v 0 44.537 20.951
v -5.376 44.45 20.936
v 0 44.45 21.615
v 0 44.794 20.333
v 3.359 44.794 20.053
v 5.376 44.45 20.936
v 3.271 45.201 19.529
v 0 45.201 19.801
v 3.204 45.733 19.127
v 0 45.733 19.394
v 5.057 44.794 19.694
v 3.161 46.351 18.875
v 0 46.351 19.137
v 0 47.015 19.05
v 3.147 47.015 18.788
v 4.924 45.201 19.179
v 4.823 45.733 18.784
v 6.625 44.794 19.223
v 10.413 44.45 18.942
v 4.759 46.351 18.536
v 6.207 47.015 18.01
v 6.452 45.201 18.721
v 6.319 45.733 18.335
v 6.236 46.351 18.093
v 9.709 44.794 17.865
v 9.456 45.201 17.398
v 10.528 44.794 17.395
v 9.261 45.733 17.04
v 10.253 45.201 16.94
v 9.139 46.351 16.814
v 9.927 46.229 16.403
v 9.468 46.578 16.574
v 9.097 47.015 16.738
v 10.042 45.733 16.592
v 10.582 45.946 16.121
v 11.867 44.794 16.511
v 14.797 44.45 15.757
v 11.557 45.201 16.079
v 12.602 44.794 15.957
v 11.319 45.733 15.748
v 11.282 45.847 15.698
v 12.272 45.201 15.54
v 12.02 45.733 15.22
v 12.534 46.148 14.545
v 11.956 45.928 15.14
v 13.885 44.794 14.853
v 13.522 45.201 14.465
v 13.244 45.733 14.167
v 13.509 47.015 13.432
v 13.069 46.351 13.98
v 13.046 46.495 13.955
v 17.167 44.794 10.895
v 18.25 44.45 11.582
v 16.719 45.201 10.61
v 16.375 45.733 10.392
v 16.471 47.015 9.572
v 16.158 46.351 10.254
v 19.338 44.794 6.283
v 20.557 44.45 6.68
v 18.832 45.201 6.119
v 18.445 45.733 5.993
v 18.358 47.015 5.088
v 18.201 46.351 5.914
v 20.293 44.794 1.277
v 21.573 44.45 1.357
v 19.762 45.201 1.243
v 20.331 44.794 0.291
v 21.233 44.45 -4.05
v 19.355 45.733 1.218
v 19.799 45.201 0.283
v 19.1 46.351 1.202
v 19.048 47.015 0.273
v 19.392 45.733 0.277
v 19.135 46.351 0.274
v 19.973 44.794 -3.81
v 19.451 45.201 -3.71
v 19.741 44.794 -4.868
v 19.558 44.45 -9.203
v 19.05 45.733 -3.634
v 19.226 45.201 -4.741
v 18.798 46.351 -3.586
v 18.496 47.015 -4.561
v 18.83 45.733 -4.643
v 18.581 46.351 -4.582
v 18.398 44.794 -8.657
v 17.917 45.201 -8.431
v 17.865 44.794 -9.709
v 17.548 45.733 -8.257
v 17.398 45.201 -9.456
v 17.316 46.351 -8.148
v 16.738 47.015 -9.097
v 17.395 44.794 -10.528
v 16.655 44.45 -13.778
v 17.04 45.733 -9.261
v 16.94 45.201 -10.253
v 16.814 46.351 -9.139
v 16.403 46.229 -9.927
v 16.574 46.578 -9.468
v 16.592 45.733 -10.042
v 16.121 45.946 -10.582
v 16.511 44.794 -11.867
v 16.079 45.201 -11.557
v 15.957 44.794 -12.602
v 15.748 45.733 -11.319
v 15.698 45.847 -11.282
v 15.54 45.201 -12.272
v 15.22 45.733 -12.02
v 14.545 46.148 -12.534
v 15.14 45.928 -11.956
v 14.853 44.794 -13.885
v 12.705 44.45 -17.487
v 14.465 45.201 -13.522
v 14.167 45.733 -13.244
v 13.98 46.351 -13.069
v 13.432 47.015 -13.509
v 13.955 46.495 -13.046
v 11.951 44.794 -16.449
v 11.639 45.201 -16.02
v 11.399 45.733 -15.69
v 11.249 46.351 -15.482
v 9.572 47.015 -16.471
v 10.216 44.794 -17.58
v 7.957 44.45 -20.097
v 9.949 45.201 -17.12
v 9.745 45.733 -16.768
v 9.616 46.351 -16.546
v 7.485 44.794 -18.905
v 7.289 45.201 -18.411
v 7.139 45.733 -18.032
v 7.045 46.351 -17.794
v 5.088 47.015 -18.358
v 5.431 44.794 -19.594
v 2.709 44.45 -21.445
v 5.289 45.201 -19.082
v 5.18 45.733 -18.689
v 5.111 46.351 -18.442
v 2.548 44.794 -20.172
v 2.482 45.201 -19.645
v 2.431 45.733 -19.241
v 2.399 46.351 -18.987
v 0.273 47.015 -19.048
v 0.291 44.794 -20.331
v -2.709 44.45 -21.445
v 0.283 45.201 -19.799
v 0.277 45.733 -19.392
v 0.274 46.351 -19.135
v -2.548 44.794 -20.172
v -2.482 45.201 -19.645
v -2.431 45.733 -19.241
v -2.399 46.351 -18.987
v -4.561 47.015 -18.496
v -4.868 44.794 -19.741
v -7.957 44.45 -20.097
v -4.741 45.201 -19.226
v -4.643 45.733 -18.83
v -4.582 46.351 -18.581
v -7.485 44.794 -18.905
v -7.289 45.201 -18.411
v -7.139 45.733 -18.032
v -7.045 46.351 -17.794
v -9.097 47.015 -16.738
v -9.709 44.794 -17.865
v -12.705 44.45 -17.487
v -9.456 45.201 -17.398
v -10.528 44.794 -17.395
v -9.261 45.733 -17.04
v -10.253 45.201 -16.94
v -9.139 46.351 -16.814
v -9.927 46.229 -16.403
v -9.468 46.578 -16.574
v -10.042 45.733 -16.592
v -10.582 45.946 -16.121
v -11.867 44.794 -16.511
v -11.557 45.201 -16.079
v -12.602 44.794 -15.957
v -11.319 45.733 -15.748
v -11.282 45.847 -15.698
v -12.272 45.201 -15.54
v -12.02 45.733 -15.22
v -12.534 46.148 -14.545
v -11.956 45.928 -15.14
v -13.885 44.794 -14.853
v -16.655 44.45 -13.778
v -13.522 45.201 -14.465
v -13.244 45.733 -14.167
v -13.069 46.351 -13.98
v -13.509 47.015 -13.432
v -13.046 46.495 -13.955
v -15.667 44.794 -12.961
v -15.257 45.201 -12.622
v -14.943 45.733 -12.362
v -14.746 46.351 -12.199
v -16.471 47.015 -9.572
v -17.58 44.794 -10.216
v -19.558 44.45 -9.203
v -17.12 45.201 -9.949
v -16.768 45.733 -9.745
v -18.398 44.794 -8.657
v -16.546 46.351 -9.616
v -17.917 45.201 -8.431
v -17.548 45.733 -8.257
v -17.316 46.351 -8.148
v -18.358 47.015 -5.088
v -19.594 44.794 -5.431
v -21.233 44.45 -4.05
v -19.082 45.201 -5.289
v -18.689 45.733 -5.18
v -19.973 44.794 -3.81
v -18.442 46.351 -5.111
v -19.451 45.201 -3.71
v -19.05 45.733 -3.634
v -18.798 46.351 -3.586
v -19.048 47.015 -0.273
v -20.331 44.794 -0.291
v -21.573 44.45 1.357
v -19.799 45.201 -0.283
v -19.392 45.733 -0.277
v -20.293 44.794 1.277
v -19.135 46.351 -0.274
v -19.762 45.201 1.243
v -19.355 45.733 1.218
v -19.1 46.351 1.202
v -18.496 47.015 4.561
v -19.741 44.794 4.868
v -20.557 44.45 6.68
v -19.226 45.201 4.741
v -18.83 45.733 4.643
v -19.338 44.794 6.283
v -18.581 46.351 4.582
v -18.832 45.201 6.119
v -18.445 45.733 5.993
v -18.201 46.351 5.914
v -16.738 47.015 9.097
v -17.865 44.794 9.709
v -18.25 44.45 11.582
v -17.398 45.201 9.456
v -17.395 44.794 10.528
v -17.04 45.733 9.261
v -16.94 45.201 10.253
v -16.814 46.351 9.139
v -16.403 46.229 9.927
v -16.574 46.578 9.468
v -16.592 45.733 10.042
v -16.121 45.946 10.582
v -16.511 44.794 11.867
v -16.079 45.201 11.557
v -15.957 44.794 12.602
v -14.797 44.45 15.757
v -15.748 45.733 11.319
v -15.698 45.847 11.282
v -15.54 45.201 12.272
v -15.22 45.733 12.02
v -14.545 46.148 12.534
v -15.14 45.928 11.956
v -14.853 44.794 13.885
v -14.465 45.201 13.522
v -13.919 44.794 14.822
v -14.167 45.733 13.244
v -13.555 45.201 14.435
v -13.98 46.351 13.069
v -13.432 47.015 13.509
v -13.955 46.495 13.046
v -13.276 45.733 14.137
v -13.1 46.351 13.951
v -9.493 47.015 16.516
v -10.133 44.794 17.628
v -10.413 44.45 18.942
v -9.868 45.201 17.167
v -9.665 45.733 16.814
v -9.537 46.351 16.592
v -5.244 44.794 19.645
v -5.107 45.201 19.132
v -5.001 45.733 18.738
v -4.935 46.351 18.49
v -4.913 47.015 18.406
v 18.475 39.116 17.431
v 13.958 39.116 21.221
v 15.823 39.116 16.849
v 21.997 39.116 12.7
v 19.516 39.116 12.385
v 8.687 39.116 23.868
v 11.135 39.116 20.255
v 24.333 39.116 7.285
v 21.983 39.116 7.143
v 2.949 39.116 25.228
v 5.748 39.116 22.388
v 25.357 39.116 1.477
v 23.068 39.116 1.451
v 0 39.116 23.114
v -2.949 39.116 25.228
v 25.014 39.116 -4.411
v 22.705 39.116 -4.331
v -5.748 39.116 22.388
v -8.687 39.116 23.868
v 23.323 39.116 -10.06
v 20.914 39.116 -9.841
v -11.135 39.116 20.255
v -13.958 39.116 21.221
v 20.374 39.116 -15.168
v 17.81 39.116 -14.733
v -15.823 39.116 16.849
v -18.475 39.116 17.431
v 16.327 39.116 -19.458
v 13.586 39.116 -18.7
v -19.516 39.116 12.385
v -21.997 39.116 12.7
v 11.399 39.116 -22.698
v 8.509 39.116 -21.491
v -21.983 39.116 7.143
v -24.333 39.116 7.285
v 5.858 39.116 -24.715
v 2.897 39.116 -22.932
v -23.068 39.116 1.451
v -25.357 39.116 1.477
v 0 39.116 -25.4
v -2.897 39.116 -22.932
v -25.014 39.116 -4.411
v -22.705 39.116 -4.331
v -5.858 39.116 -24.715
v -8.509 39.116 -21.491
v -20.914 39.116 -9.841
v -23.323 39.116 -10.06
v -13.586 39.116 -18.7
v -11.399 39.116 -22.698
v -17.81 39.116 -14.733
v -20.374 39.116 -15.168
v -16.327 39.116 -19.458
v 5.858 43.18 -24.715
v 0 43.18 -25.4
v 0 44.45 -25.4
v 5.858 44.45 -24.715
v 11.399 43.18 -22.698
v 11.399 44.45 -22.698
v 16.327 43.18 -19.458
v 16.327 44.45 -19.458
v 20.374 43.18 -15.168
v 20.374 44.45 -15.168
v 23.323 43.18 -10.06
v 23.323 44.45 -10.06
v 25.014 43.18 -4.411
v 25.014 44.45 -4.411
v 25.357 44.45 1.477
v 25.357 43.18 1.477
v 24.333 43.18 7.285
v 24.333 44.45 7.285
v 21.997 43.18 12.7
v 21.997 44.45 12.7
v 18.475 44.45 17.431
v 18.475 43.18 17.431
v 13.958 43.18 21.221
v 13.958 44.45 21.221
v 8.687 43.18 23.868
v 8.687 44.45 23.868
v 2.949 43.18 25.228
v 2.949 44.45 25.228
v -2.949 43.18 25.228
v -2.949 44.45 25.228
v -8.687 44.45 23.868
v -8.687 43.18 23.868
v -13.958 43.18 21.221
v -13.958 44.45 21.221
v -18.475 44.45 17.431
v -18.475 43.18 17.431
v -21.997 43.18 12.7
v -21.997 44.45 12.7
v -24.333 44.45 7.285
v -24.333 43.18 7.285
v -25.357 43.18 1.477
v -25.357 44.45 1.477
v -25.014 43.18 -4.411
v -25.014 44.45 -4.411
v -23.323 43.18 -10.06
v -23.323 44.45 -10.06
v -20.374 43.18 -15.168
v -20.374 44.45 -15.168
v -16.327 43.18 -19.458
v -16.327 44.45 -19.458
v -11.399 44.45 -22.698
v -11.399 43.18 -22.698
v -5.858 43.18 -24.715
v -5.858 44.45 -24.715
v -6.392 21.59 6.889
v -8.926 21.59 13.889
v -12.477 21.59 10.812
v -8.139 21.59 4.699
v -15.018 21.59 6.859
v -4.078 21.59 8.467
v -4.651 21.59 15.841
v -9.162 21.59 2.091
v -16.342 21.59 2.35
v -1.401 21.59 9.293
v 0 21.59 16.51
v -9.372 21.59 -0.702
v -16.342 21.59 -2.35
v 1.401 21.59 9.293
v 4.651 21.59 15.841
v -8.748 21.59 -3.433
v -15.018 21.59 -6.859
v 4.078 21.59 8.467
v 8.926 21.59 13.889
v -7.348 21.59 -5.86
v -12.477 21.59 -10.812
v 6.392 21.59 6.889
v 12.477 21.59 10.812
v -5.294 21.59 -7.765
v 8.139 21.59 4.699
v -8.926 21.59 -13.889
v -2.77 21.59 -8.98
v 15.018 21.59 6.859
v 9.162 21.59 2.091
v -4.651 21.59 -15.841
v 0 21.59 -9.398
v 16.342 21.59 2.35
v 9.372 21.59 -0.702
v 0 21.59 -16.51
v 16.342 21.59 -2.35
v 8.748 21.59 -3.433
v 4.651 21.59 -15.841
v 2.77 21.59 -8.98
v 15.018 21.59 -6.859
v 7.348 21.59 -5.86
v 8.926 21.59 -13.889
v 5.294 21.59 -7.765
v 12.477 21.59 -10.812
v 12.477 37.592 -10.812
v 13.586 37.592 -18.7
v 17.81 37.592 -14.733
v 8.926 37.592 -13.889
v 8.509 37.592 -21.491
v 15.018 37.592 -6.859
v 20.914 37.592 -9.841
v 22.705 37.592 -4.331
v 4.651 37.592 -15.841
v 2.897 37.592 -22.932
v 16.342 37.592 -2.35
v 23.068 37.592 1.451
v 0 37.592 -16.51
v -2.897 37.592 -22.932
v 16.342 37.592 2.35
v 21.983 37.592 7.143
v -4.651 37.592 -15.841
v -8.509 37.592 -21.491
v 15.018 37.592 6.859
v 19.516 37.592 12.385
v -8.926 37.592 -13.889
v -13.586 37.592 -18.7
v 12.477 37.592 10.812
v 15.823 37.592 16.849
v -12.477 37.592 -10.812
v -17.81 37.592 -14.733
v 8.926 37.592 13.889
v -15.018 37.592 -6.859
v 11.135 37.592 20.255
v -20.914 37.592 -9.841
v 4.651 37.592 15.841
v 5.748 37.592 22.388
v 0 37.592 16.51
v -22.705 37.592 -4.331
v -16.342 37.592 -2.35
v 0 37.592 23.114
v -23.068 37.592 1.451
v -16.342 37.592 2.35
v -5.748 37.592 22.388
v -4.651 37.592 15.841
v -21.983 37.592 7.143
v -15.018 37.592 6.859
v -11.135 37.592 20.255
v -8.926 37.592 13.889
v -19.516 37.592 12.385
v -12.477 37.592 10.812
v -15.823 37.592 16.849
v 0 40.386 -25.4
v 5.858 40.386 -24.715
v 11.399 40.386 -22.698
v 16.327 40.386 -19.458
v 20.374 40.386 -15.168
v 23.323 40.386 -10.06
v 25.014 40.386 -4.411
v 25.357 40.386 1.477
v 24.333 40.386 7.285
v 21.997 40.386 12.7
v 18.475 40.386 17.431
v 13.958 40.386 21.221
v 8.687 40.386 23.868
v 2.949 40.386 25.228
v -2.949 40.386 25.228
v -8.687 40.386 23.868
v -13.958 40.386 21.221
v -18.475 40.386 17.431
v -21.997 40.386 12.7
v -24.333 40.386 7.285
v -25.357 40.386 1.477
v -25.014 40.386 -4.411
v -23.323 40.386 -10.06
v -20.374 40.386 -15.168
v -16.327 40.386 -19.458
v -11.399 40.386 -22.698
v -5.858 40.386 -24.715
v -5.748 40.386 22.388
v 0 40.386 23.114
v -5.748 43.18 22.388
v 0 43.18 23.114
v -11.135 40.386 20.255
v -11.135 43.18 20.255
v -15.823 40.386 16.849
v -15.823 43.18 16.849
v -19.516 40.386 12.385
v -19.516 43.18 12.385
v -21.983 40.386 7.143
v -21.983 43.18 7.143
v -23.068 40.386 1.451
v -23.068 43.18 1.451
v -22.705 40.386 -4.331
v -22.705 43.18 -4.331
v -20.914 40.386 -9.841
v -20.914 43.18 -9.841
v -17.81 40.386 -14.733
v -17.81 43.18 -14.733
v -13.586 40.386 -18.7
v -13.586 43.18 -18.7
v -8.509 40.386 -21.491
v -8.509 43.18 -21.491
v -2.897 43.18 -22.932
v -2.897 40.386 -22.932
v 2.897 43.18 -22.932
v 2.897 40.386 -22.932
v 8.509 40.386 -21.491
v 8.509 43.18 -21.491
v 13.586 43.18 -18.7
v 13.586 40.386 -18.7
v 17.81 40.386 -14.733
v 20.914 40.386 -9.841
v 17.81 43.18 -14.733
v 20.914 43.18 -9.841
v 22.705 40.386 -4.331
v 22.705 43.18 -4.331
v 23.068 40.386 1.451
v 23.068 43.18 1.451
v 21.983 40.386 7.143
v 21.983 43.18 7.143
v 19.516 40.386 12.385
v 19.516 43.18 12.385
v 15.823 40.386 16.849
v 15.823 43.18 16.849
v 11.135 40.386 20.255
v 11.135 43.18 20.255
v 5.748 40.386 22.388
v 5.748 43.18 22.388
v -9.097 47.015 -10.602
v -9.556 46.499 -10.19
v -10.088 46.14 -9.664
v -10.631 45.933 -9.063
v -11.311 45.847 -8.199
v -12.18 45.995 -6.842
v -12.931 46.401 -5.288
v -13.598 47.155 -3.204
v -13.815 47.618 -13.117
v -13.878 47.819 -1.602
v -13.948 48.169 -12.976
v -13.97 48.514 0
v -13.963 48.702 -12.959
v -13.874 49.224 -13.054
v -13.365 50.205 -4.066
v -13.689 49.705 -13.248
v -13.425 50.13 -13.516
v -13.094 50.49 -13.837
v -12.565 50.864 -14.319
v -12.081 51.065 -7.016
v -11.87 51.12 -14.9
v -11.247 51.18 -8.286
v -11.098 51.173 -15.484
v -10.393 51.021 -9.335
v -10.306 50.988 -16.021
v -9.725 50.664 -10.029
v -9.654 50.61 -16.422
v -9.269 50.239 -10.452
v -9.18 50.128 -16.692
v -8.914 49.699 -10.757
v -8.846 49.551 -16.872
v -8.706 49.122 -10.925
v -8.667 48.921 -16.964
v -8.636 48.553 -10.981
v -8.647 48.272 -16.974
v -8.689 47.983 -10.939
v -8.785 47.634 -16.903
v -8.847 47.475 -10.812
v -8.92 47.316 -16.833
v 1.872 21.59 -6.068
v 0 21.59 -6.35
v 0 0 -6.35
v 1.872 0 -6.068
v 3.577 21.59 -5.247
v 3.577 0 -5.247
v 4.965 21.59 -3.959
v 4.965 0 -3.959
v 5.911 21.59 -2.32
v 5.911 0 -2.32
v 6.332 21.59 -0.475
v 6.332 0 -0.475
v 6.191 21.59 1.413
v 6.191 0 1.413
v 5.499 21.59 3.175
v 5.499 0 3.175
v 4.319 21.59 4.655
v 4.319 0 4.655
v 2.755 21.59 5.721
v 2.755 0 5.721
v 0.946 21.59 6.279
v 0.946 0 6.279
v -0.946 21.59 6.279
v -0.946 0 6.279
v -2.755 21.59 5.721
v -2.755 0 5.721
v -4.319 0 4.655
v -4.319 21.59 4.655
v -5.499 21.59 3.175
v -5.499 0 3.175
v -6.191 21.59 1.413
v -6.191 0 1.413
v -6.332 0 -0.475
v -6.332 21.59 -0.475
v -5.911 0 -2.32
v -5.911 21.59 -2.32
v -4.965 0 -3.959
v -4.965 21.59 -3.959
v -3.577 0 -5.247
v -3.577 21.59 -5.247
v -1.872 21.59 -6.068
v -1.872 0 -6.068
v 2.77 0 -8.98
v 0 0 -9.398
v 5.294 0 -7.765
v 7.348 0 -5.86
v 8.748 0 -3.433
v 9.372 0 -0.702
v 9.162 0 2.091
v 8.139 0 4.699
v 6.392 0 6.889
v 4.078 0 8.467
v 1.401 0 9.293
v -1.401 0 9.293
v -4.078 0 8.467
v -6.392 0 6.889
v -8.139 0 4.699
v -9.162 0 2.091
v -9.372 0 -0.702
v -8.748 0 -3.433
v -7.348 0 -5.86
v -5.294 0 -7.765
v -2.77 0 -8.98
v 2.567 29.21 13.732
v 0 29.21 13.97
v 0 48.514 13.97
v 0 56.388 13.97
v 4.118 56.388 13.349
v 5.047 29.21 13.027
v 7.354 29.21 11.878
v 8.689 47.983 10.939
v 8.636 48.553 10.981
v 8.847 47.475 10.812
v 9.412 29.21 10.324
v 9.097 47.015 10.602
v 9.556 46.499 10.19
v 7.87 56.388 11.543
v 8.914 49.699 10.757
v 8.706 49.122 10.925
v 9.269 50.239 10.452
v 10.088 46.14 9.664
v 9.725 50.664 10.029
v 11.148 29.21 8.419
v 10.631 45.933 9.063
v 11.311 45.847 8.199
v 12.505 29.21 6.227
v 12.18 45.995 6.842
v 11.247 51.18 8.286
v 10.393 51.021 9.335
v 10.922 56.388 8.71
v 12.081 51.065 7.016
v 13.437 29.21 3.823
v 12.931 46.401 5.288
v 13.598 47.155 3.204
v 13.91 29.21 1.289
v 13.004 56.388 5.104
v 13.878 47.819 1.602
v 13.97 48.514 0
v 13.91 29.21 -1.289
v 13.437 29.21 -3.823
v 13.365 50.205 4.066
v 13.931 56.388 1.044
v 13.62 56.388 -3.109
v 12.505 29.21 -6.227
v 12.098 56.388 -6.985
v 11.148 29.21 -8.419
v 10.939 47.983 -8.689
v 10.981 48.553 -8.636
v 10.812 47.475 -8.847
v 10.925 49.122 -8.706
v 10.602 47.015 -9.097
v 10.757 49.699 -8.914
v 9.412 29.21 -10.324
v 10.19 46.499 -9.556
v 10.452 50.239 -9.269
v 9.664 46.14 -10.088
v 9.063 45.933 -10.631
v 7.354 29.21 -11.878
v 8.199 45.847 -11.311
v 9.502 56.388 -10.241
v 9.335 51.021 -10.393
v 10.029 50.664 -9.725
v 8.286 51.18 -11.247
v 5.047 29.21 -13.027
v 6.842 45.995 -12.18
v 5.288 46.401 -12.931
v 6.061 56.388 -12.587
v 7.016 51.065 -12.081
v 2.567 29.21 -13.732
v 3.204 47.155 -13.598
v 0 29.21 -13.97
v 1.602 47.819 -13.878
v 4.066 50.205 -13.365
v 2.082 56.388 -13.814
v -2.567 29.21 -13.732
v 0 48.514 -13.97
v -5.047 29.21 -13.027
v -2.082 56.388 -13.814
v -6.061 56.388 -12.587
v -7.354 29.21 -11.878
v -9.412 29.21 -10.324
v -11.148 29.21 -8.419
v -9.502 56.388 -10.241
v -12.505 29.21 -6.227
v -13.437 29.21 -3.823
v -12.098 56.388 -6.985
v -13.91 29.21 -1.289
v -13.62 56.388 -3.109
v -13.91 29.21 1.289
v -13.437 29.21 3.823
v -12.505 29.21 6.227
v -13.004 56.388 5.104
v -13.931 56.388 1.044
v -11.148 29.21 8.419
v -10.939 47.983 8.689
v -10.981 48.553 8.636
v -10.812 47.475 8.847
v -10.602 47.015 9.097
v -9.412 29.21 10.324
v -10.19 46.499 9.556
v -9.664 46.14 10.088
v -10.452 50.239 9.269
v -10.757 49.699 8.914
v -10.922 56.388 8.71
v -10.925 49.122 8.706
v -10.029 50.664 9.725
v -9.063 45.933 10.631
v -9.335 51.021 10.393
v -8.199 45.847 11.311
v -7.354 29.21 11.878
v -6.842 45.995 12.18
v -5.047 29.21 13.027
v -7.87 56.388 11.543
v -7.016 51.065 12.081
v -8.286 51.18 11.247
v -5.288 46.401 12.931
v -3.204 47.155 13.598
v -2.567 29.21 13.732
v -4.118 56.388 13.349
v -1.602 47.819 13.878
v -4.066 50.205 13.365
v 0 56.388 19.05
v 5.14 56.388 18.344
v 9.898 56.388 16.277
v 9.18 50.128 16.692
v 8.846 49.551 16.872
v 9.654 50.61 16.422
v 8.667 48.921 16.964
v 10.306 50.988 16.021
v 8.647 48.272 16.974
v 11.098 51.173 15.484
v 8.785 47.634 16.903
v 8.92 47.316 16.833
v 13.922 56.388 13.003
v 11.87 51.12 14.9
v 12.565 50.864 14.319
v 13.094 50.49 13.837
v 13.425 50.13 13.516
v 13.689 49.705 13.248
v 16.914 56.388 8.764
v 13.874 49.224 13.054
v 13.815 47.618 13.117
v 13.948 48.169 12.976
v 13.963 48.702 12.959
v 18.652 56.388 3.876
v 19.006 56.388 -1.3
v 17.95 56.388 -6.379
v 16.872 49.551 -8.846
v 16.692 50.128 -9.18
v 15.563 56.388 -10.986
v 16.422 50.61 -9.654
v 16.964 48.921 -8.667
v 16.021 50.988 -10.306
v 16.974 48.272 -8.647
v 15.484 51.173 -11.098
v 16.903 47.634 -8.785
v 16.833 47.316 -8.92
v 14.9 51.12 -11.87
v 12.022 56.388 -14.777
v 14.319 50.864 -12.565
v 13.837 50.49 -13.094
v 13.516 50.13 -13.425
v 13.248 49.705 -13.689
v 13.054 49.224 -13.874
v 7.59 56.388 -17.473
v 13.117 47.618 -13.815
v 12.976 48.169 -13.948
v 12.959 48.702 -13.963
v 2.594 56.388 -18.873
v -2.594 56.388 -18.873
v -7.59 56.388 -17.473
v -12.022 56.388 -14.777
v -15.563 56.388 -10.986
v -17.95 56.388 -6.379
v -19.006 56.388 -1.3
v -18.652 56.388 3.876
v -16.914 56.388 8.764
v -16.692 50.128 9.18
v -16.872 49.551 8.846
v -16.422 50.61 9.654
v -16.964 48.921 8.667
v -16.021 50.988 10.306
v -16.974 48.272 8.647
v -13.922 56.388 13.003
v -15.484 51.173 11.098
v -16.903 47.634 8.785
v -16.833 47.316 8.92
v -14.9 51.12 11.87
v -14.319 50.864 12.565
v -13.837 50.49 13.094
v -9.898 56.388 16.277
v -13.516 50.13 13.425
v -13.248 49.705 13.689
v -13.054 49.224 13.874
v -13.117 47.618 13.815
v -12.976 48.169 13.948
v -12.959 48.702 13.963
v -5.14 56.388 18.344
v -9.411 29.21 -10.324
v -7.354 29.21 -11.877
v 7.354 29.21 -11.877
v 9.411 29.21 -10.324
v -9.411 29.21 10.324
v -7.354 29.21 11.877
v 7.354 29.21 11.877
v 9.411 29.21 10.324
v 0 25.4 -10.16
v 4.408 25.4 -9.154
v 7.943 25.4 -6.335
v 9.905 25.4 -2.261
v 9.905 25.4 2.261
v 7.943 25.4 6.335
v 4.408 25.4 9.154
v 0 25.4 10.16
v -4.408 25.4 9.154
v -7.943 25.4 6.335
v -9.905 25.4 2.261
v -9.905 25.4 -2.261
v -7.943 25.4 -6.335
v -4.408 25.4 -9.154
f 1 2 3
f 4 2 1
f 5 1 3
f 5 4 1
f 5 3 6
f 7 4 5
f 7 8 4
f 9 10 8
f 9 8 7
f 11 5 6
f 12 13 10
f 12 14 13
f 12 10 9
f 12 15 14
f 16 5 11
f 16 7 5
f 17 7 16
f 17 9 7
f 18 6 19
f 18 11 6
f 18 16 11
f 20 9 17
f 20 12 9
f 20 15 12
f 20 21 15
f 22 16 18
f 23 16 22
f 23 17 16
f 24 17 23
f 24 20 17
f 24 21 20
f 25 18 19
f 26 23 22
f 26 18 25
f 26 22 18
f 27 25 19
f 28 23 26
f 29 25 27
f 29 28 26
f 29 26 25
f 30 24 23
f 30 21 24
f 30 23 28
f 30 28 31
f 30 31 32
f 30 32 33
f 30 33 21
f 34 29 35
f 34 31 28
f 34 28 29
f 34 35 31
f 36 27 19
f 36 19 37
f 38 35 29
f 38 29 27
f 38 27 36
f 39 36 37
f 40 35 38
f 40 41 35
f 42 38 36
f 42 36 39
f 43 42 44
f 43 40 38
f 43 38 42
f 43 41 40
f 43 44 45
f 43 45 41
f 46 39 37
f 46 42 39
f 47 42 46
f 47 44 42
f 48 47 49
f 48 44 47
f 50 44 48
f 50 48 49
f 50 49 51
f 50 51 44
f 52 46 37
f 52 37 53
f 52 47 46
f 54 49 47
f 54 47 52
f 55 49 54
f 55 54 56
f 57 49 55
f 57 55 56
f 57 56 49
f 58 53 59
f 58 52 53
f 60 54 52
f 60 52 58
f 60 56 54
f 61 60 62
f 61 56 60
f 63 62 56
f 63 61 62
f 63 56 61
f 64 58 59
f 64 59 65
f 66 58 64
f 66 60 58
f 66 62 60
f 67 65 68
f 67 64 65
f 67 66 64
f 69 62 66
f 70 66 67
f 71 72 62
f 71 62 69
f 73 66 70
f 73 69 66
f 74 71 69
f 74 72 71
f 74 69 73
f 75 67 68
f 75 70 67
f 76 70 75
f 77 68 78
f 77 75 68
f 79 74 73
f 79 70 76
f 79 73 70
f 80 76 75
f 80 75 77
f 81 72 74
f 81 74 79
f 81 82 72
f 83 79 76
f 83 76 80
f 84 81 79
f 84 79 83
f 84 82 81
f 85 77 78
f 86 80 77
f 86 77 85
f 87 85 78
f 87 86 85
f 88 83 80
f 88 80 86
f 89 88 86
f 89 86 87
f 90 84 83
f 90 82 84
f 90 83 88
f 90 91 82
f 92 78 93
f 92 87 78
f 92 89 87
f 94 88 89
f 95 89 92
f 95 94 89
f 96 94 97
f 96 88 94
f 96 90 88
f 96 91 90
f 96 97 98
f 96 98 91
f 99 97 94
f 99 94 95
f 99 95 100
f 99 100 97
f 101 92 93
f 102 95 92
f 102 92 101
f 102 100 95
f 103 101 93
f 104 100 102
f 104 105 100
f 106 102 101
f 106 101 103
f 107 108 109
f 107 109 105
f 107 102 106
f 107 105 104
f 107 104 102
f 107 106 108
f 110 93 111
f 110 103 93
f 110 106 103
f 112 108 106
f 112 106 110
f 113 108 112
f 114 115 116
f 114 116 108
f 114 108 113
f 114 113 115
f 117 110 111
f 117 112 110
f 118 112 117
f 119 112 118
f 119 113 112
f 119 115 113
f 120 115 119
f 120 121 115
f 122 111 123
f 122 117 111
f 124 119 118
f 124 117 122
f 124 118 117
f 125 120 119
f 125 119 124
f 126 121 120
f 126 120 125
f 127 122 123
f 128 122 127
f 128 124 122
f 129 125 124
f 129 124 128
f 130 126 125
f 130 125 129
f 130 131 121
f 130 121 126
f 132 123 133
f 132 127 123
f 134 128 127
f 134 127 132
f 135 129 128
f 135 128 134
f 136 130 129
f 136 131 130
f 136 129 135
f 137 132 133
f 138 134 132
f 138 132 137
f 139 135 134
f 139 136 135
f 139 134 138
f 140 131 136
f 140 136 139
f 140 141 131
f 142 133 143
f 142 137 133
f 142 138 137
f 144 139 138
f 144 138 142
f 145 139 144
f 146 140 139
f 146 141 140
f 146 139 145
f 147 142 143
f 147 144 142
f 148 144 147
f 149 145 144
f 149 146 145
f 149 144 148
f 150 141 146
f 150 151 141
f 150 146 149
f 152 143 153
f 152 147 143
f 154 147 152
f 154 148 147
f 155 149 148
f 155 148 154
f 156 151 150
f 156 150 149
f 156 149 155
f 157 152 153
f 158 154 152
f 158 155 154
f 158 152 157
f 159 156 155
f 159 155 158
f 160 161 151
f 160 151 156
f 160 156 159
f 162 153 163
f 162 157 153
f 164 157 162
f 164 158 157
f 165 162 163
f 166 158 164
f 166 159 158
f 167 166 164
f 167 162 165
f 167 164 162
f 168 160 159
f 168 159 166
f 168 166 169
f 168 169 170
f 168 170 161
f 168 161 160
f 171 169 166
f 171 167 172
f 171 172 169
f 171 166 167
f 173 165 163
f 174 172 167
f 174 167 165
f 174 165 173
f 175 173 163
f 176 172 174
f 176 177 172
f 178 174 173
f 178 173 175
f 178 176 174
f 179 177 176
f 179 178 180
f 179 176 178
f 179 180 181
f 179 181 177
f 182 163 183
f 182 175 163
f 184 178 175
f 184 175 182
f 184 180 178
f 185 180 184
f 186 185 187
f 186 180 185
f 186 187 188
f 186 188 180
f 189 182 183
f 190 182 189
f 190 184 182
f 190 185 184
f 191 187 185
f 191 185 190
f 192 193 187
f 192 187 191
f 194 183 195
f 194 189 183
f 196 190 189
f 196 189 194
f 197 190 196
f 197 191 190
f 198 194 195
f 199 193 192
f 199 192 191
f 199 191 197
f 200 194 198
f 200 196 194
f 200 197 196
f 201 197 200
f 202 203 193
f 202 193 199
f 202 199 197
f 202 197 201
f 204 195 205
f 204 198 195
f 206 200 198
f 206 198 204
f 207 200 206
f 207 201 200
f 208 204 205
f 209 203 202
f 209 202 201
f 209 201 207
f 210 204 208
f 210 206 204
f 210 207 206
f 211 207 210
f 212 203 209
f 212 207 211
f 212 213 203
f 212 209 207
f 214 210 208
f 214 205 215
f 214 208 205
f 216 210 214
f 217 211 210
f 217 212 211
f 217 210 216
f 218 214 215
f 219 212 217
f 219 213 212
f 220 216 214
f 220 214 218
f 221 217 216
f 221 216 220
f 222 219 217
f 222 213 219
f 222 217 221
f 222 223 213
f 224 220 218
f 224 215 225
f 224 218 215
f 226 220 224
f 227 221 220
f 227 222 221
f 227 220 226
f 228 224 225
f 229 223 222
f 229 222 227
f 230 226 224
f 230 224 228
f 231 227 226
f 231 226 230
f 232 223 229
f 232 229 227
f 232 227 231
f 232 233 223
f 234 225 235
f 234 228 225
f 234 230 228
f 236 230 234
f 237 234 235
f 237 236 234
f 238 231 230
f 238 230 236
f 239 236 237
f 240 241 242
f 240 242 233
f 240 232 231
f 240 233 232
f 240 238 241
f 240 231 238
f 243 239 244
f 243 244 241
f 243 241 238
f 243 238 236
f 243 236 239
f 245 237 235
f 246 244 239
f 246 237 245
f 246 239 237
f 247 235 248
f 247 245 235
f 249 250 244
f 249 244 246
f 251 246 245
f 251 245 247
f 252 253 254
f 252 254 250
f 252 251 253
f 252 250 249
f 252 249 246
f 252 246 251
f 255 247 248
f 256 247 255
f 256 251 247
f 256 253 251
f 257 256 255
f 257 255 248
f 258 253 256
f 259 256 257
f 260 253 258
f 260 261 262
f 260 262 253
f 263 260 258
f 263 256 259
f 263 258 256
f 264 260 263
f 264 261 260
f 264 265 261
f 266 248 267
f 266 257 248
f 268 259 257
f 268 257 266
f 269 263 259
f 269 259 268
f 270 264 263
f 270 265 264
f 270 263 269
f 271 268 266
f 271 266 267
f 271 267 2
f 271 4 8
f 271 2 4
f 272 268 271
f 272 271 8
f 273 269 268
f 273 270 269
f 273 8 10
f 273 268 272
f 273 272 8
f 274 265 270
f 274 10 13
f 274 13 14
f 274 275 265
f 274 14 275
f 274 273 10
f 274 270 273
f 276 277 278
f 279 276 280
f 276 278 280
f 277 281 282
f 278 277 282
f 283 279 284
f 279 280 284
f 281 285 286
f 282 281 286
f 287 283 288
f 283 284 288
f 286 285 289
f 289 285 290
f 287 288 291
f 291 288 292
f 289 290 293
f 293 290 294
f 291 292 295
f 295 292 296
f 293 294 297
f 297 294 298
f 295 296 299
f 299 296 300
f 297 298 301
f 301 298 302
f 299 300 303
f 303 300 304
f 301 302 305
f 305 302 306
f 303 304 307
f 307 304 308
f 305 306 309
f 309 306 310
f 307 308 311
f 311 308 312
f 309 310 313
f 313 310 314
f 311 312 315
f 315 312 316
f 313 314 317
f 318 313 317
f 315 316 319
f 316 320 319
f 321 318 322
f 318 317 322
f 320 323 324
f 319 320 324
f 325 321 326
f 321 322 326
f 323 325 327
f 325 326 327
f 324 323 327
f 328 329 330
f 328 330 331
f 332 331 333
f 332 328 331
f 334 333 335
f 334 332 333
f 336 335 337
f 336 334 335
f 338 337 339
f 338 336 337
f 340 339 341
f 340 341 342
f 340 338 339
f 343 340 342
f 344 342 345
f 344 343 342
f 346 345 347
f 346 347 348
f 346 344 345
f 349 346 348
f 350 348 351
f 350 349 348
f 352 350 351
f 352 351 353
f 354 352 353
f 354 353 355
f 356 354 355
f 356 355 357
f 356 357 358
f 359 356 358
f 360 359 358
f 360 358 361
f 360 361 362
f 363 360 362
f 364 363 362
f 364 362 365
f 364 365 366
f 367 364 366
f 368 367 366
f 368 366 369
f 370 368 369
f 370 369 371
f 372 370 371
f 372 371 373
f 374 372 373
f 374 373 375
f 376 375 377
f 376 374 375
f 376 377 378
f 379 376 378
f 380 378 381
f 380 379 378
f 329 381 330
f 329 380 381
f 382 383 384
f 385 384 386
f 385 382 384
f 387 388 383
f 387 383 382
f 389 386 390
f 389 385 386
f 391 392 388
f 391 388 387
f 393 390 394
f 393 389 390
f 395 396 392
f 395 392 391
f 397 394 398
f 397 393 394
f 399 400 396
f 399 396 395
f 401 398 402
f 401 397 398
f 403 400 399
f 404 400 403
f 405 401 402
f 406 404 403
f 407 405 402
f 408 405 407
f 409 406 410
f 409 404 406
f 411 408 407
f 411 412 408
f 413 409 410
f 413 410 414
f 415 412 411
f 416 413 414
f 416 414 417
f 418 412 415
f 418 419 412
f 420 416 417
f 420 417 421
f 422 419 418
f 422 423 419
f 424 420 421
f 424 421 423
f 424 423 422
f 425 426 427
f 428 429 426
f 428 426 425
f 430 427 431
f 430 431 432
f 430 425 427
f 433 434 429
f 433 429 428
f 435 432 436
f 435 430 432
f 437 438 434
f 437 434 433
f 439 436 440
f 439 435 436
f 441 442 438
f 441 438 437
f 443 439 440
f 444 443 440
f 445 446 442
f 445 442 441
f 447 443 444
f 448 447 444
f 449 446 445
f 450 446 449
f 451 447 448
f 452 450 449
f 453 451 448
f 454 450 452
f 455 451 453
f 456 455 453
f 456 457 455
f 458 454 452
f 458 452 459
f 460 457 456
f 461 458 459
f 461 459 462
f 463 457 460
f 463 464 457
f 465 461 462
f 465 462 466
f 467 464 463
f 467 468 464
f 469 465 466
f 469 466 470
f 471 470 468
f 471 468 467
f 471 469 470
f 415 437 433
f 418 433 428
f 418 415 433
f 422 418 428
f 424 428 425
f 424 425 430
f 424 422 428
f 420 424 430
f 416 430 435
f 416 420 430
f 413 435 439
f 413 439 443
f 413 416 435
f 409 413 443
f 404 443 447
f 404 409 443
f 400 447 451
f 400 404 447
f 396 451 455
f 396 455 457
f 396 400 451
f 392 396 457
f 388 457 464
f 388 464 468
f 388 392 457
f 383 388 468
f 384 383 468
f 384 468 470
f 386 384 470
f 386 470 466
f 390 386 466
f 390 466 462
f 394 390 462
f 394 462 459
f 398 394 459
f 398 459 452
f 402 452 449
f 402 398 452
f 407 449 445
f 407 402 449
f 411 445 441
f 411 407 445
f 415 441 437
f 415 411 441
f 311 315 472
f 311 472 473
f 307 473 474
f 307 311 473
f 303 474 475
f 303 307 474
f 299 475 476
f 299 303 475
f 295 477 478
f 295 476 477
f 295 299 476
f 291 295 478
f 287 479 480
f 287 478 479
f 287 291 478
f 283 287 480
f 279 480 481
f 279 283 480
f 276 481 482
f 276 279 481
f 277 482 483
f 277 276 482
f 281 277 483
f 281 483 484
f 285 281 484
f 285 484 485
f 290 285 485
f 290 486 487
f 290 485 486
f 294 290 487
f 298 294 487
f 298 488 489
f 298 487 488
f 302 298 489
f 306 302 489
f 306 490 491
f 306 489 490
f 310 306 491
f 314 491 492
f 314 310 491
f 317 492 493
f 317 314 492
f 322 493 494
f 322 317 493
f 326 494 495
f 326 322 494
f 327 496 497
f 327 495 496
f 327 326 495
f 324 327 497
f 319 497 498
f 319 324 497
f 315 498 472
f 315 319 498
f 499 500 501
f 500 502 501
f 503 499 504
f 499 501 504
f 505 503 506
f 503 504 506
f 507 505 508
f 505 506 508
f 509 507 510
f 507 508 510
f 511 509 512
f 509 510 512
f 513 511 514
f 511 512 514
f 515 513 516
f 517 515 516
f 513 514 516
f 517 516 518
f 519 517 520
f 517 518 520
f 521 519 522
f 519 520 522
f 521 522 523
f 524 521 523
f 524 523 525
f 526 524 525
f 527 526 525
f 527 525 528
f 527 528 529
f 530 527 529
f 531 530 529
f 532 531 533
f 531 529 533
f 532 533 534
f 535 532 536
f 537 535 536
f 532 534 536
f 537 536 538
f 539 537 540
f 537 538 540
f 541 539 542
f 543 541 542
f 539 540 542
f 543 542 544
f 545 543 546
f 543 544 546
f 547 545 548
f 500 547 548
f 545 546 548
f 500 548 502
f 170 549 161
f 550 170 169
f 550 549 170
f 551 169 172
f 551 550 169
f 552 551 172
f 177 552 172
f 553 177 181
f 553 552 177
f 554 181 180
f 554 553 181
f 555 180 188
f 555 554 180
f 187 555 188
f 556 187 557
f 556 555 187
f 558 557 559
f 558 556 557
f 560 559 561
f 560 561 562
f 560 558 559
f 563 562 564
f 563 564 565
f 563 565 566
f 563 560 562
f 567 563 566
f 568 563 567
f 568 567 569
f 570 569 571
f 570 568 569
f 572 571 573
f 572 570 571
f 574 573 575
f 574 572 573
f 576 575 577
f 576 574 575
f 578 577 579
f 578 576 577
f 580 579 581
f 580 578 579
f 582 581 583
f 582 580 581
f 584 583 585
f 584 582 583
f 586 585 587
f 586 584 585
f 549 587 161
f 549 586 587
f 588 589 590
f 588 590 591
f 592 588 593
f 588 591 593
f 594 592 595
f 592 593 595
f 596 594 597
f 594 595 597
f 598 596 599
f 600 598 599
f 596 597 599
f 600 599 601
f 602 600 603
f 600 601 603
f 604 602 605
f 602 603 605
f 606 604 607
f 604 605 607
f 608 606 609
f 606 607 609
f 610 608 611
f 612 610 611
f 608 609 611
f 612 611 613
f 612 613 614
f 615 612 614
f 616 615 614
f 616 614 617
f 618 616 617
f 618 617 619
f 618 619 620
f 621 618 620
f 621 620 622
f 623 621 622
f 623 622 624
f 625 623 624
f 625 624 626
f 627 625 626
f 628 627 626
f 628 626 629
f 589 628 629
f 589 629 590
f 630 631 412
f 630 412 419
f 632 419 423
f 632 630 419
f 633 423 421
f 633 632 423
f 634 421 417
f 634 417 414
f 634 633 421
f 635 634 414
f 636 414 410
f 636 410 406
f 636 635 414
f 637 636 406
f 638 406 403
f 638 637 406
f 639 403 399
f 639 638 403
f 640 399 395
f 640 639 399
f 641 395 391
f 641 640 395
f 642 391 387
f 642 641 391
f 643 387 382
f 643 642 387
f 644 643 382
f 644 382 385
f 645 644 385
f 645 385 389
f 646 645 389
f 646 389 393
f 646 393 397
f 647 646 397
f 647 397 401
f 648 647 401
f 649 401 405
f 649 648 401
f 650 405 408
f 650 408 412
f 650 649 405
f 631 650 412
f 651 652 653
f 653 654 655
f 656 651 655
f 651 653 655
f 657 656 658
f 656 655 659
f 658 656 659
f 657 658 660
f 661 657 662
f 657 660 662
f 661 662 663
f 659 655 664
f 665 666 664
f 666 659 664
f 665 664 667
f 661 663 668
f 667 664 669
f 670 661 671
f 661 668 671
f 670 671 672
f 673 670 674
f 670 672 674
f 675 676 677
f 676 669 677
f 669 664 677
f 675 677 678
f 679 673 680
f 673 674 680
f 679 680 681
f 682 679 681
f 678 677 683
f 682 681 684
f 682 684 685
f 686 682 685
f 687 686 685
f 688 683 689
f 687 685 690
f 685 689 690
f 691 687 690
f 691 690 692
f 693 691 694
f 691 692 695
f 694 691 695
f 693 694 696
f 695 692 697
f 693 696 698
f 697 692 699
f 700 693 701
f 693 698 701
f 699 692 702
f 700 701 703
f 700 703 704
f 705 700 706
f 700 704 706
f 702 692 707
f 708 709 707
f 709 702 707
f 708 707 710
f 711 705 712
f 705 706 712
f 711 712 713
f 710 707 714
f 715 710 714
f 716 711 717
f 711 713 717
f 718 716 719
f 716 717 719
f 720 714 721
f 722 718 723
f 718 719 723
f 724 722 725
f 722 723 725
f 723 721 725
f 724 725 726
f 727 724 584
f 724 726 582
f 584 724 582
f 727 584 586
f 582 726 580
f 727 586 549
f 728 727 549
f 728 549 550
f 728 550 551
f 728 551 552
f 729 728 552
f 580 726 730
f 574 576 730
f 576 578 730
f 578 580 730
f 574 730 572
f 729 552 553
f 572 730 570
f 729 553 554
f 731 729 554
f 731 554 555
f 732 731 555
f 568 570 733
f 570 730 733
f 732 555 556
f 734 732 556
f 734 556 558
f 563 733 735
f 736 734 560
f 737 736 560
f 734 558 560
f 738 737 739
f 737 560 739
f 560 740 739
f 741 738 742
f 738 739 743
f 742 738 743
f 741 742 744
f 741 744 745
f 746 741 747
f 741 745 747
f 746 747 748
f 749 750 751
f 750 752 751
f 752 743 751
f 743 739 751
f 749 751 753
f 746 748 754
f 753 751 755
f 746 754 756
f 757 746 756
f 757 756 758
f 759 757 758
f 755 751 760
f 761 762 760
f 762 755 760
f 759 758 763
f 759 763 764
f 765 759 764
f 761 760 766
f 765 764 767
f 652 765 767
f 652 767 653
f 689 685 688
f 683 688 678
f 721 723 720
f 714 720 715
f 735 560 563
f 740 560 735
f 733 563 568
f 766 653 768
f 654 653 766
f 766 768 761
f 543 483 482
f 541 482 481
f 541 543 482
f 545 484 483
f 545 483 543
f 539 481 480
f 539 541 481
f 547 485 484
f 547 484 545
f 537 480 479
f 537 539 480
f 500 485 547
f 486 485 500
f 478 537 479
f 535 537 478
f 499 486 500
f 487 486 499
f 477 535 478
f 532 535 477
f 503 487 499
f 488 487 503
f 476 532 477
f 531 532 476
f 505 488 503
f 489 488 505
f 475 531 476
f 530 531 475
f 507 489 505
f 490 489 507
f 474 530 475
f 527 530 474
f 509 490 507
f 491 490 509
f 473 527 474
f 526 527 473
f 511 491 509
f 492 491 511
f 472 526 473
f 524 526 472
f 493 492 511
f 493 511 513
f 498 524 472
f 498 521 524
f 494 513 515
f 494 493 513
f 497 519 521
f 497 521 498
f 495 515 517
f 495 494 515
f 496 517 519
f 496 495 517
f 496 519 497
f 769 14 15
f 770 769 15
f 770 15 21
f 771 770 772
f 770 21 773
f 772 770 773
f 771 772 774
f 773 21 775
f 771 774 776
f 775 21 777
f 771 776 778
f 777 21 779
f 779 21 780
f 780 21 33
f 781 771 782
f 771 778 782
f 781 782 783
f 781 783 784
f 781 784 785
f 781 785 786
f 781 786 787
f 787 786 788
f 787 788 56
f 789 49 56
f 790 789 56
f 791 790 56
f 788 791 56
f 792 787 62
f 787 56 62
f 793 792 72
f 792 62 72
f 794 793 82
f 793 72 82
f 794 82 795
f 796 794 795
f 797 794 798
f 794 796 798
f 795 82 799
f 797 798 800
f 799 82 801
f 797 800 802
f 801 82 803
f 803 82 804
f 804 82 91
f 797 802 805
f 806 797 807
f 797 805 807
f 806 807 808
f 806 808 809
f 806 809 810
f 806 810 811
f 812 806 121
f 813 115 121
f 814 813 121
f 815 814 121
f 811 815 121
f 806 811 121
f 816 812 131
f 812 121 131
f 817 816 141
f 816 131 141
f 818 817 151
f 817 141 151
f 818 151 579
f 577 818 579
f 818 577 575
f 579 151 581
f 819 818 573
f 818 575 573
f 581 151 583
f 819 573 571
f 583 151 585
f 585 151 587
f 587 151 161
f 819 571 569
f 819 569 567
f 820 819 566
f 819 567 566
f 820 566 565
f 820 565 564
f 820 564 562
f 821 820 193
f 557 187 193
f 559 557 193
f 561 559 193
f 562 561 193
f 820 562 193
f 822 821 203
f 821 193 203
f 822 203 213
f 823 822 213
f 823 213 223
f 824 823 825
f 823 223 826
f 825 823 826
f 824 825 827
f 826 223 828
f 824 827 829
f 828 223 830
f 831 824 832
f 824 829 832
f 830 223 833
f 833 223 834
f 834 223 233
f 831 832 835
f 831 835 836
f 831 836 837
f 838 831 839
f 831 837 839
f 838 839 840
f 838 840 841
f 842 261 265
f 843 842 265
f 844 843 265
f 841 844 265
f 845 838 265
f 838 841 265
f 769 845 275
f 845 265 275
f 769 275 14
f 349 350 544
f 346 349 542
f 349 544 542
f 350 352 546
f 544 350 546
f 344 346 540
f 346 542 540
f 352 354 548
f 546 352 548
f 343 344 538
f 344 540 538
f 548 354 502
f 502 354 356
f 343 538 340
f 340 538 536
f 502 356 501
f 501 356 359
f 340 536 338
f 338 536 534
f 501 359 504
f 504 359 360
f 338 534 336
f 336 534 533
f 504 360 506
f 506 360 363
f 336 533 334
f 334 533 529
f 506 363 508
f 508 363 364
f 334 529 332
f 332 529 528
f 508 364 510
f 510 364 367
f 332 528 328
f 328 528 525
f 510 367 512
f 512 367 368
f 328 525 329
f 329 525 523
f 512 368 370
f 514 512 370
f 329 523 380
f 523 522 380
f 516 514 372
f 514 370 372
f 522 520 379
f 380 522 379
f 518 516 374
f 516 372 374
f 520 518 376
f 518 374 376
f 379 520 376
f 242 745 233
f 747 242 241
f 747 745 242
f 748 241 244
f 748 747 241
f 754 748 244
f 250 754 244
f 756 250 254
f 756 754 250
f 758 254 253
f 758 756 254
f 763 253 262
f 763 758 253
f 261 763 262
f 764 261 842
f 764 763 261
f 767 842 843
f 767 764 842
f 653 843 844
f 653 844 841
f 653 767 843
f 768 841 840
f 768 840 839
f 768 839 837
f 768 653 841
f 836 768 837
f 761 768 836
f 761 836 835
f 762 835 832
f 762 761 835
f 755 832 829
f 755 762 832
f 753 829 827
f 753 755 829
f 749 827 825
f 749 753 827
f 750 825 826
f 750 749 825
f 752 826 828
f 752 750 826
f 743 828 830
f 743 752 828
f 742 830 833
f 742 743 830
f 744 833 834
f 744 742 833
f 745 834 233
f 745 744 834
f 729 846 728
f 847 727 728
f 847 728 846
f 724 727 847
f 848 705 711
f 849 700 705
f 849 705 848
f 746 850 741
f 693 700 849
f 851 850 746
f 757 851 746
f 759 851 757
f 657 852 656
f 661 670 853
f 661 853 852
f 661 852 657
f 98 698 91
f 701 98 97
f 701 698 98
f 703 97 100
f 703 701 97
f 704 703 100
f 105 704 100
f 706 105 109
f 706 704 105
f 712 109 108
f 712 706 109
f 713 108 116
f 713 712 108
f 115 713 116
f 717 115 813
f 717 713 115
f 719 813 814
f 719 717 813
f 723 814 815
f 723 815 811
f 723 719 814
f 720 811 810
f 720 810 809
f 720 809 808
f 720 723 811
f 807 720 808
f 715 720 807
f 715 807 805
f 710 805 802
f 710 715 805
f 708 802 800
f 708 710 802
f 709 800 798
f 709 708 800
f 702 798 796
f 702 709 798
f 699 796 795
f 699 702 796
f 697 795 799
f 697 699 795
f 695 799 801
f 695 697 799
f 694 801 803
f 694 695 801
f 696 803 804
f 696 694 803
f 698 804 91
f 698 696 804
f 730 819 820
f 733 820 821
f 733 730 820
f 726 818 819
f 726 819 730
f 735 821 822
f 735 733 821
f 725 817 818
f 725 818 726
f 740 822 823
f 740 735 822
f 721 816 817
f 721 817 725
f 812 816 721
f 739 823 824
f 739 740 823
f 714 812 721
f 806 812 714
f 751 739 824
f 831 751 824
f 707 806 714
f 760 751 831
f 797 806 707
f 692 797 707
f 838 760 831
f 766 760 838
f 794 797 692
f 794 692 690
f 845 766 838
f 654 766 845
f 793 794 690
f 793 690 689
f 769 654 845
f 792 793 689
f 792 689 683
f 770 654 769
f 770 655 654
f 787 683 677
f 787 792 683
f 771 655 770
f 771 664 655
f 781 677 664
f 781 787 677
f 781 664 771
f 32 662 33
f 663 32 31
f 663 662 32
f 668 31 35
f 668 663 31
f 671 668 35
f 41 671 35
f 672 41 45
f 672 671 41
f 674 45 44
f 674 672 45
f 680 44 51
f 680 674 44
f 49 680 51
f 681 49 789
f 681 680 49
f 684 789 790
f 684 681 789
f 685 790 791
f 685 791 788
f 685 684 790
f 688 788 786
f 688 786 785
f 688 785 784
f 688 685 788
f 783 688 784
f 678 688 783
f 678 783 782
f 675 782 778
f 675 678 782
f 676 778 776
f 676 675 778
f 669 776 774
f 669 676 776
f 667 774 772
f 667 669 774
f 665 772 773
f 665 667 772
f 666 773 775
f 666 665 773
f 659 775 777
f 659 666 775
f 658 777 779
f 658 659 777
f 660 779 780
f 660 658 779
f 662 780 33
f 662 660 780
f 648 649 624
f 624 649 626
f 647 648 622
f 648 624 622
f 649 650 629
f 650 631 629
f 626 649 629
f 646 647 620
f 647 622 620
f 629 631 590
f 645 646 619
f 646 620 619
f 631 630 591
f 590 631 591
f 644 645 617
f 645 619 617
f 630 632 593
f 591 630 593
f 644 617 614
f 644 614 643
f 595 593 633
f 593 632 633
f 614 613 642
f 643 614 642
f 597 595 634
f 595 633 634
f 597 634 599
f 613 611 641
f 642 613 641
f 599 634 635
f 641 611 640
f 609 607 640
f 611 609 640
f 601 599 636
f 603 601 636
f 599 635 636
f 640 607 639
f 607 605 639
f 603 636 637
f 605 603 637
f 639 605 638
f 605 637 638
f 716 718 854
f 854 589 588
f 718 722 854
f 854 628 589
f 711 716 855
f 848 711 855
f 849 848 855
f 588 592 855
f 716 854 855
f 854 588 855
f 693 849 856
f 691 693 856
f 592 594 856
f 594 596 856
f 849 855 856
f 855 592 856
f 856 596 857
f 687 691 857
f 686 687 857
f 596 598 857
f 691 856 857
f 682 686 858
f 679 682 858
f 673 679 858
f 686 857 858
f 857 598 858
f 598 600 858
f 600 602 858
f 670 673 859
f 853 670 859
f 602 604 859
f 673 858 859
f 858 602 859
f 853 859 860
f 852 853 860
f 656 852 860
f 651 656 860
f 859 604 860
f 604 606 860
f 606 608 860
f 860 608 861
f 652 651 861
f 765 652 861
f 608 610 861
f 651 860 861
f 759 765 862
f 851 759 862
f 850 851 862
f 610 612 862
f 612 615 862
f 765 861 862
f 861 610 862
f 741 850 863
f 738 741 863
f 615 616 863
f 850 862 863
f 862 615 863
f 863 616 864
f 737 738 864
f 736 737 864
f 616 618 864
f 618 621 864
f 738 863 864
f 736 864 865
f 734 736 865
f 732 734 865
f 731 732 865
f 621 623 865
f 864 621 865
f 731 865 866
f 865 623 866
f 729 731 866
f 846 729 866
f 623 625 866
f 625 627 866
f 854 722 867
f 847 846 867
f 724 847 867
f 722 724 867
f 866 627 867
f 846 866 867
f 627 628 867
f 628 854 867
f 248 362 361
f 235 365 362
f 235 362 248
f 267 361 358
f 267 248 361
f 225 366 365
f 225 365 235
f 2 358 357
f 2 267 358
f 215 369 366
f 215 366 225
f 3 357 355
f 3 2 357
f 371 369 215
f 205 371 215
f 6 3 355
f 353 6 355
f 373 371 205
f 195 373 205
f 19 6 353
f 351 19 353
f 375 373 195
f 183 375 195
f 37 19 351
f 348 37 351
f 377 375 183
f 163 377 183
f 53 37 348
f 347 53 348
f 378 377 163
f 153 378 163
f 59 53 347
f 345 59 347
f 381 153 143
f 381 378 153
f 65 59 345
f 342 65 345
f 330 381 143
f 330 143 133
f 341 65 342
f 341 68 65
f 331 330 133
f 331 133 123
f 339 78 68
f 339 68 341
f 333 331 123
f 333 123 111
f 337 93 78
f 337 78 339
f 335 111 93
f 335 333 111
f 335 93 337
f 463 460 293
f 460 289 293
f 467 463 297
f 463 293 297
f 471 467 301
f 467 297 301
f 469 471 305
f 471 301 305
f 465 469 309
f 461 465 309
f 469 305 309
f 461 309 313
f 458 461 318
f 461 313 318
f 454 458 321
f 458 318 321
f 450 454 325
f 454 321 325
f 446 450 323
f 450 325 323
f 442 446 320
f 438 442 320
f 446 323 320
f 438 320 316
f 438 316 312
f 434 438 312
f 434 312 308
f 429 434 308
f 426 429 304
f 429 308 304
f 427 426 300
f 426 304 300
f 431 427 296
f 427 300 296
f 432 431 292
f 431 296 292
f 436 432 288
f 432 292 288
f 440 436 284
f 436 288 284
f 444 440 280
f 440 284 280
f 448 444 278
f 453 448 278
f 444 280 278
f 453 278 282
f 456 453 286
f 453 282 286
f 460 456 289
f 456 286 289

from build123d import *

# Parameters (mm, degrees)
SKETCH1_R                = 32.385
STEEL_CYLINDER_DEPTH     = 56.388
SKETCH3_R                = 32.385
SKETCH3_R_2              = 25.4
BOTTOM_CUT_BIG_DEPTH     = 44.45
SKETCH2_R                = 25.4
SKETCH2_R_2              = 9.398
BOTTOM_CUT_STEM_DEPTH    = 21.59
TOP_START                = -11.938
SKETCH4_R                = 32.385
SKETCH4_R_2              = 19.05
TOP_CUT_DEPTH            = 11.938
STEM_INNER_REACH         = 68.858
SKETCH5_R                = 6.35
SKETCH6_R                = 13.97
TOP_INNER_DEPTH          = 27.178
SKETCH7_W                = 2.286
SKETCH7_H                = 2.794
TOP_FILLET_R             = 2.5654
SKETCH8_W                = 2.286
SKETCH8_H                = 17.526
INTLET_HOLE_REACH        = 68.858
SKETCH10_R               = 2.667
INLET_PATTERN_COUNT      = 4
INNER_CHAMFER_SIZE       = 7.62
SKETCH11_R               = 23.114
SKETCH11_R_2             = 16.51
MIDDLE_OUTER_CUT_2_DEPTH = 16.002


with BuildPart() as part:
    # Sketch1 → Steel Cylinder (new body)
    with BuildSketch(Plane(origin=(0, 0, 0), x_dir=(1, 0, 0), z_dir=(0, 1, 0))):
        with Locations(Location((0, 0, 0), (0, 0, 270))):
            Circle(SKETCH1_R)
    extrude(amount=STEEL_CYLINDER_DEPTH)

    # Sketch3 → Bottom Cut Big (cut)
    with BuildSketch(Plane.XZ):
        with Locations(Location((0, 0, 0), (0, 0, 270))):
            Circle(SKETCH3_R)
        with Locations(Location((0, 0, 0), (0, 0, 270))):
            Circle(SKETCH3_R_2, mode=Mode.SUBTRACT)
    extrude(amount=-BOTTOM_CUT_BIG_DEPTH, mode=Mode.SUBTRACT)

    # Sketch2 → Bottom Cut Stem (cut)
    with BuildSketch(Plane.XZ):
        with Locations(Location((0, 0, 0), (0, 0, 270))):
            Circle(SKETCH2_R)
        with Locations(Location((0, 0, 0), (0, 0, 270))):
            Circle(SKETCH2_R_2, mode=Mode.SUBTRACT)
    extrude(amount=-BOTTOM_CUT_STEM_DEPTH, mode=Mode.SUBTRACT)

    # Sketch4 → Top Cut (cut)
    with BuildSketch(Plane(origin=(0, 56.388, 0), x_dir=(1, 0, 0), z_dir=(0, 1, 0)).offset(TOP_START)):
        Circle(SKETCH4_R)
        with Locations(Location((0, 0, 0), (0, 0, 270))):
            Circle(SKETCH4_R_2, mode=Mode.SUBTRACT)
    extrude(amount=TOP_CUT_DEPTH, mode=Mode.SUBTRACT)

    # Sketch5 → Stem Inner (cut, up to next)
    with BuildSketch(Plane.XZ, mode=Mode.PRIVATE) as stem_inner_sk1:
        with Locations(Location((0, 0, 0), (0, 0, 270))):
            Circle(SKETCH5_R)
    stem_inner_tool1 = extrude(stem_inner_sk1.sketch, amount=-STEM_INNER_REACH, mode=Mode.PRIVATE) & part.part
    add(stem_inner_tool1.solids().sort_by_distance((0, 0, 0))[0], mode=Mode.SUBTRACT)

    # Sketch6 → Top Inner (cut)
    with BuildSketch(Plane(origin=(0, 56.388, 0), x_dir=(1, 0, 0), z_dir=(0, 1, 0))):
        with Locations(Location((0, 0, 0), (0, 0, 270))):
            Circle(SKETCH6_R)
    extrude(amount=-TOP_INNER_DEPTH, mode=Mode.SUBTRACT)

    # Sketch7 → O Ring (revolve, cut)
    with BuildSketch(Plane.XY, mode=Mode.PRIVATE) as o_ring_sk:
        with Locations((24.257, 41.783)):
            Rectangle(SKETCH7_W, SKETCH7_H)
    revolve(o_ring_sk.sketch.rotate(Axis((0, 67.055012984, 0), (0, -1, 0)), 90), axis=Axis((0, 67.055012984, 0), (0, -1, 0)), mode=Mode.SUBTRACT)

    # Top Fillet
    top_fillet_edges = [part.edges().sort_by_distance(p)[0] for p in [
        (0, 44.45, -19.05),
    ]]
    fillet(top_fillet_edges, radius=TOP_FILLET_R)

    # Sketch8 → Based O Ring Cut (revolve, cut)
    with BuildSketch(Plane.XY, mode=Mode.PRIVATE) as based_o_ring_cut_sk:
        with Locations((24.257, 30.353)):
            Rectangle(SKETCH8_W, SKETCH8_H)
    revolve(based_o_ring_cut_sk.sketch.rotate(Axis((0, 67.055012984, 0), (0, -1, 0)), 90), axis=Axis((0, 67.055012984, 0), (0, -1, 0)), mode=Mode.SUBTRACT)

    # Sketch10 → Intlet Hole (cut, up to next)
    with BuildSketch(Plane.XY, mode=Mode.PRIVATE) as intlet_hole_sk1:
        with Locations(Location((11.303, 48.514, 0), (0, 0, 214.187627302))):
            Circle(SKETCH10_R)
    intlet_hole_tool1 = extrude(intlet_hole_sk1.sketch, amount=INTLET_HOLE_REACH, mode=Mode.PRIVATE) & part.part
    intlet_hole = intlet_hole_tool1.solids().sort_by_distance((11.303, 48.514, 0))[0]
    add(intlet_hole, mode=Mode.SUBTRACT)

    # Inlet Pattern: Intlet Hole ×4 about axis
    inlet_pattern_axis = Axis((0, 67.055012984, 0), (0, -1, 0))
    for i in range(1, INLET_PATTERN_COUNT):
        add(intlet_hole.rotate(inlet_pattern_axis, i * 360 / INLET_PATTERN_COUNT), mode=Mode.SUBTRACT)

    # Inner Chamfer
    inner_chamfer_edges = [part.edges().sort_by_distance(p)[0] for p in [
        (0, 29.21, 6.35),
    ]]
    chamfer(inner_chamfer_edges, length=INNER_CHAMFER_SIZE - 0.0001)  # a hair under: the kernel refuses the full size

    # Sketch11 → Middle Outer Cut 2 (cut)
    with BuildSketch(Plane.XZ.offset(-21.59)):
        with Locations(Location((0, 0, 0), (0, 0, 90))):
            Circle(SKETCH11_R)
        with Locations(Location((0, 0, 0), (0, 0, 270))):
            Circle(SKETCH11_R_2, mode=Mode.SUBTRACT)
    extrude(amount=-MIDDLE_OUTER_CUT_2_DEPTH, mode=Mode.SUBTRACT)


solid = part.part
